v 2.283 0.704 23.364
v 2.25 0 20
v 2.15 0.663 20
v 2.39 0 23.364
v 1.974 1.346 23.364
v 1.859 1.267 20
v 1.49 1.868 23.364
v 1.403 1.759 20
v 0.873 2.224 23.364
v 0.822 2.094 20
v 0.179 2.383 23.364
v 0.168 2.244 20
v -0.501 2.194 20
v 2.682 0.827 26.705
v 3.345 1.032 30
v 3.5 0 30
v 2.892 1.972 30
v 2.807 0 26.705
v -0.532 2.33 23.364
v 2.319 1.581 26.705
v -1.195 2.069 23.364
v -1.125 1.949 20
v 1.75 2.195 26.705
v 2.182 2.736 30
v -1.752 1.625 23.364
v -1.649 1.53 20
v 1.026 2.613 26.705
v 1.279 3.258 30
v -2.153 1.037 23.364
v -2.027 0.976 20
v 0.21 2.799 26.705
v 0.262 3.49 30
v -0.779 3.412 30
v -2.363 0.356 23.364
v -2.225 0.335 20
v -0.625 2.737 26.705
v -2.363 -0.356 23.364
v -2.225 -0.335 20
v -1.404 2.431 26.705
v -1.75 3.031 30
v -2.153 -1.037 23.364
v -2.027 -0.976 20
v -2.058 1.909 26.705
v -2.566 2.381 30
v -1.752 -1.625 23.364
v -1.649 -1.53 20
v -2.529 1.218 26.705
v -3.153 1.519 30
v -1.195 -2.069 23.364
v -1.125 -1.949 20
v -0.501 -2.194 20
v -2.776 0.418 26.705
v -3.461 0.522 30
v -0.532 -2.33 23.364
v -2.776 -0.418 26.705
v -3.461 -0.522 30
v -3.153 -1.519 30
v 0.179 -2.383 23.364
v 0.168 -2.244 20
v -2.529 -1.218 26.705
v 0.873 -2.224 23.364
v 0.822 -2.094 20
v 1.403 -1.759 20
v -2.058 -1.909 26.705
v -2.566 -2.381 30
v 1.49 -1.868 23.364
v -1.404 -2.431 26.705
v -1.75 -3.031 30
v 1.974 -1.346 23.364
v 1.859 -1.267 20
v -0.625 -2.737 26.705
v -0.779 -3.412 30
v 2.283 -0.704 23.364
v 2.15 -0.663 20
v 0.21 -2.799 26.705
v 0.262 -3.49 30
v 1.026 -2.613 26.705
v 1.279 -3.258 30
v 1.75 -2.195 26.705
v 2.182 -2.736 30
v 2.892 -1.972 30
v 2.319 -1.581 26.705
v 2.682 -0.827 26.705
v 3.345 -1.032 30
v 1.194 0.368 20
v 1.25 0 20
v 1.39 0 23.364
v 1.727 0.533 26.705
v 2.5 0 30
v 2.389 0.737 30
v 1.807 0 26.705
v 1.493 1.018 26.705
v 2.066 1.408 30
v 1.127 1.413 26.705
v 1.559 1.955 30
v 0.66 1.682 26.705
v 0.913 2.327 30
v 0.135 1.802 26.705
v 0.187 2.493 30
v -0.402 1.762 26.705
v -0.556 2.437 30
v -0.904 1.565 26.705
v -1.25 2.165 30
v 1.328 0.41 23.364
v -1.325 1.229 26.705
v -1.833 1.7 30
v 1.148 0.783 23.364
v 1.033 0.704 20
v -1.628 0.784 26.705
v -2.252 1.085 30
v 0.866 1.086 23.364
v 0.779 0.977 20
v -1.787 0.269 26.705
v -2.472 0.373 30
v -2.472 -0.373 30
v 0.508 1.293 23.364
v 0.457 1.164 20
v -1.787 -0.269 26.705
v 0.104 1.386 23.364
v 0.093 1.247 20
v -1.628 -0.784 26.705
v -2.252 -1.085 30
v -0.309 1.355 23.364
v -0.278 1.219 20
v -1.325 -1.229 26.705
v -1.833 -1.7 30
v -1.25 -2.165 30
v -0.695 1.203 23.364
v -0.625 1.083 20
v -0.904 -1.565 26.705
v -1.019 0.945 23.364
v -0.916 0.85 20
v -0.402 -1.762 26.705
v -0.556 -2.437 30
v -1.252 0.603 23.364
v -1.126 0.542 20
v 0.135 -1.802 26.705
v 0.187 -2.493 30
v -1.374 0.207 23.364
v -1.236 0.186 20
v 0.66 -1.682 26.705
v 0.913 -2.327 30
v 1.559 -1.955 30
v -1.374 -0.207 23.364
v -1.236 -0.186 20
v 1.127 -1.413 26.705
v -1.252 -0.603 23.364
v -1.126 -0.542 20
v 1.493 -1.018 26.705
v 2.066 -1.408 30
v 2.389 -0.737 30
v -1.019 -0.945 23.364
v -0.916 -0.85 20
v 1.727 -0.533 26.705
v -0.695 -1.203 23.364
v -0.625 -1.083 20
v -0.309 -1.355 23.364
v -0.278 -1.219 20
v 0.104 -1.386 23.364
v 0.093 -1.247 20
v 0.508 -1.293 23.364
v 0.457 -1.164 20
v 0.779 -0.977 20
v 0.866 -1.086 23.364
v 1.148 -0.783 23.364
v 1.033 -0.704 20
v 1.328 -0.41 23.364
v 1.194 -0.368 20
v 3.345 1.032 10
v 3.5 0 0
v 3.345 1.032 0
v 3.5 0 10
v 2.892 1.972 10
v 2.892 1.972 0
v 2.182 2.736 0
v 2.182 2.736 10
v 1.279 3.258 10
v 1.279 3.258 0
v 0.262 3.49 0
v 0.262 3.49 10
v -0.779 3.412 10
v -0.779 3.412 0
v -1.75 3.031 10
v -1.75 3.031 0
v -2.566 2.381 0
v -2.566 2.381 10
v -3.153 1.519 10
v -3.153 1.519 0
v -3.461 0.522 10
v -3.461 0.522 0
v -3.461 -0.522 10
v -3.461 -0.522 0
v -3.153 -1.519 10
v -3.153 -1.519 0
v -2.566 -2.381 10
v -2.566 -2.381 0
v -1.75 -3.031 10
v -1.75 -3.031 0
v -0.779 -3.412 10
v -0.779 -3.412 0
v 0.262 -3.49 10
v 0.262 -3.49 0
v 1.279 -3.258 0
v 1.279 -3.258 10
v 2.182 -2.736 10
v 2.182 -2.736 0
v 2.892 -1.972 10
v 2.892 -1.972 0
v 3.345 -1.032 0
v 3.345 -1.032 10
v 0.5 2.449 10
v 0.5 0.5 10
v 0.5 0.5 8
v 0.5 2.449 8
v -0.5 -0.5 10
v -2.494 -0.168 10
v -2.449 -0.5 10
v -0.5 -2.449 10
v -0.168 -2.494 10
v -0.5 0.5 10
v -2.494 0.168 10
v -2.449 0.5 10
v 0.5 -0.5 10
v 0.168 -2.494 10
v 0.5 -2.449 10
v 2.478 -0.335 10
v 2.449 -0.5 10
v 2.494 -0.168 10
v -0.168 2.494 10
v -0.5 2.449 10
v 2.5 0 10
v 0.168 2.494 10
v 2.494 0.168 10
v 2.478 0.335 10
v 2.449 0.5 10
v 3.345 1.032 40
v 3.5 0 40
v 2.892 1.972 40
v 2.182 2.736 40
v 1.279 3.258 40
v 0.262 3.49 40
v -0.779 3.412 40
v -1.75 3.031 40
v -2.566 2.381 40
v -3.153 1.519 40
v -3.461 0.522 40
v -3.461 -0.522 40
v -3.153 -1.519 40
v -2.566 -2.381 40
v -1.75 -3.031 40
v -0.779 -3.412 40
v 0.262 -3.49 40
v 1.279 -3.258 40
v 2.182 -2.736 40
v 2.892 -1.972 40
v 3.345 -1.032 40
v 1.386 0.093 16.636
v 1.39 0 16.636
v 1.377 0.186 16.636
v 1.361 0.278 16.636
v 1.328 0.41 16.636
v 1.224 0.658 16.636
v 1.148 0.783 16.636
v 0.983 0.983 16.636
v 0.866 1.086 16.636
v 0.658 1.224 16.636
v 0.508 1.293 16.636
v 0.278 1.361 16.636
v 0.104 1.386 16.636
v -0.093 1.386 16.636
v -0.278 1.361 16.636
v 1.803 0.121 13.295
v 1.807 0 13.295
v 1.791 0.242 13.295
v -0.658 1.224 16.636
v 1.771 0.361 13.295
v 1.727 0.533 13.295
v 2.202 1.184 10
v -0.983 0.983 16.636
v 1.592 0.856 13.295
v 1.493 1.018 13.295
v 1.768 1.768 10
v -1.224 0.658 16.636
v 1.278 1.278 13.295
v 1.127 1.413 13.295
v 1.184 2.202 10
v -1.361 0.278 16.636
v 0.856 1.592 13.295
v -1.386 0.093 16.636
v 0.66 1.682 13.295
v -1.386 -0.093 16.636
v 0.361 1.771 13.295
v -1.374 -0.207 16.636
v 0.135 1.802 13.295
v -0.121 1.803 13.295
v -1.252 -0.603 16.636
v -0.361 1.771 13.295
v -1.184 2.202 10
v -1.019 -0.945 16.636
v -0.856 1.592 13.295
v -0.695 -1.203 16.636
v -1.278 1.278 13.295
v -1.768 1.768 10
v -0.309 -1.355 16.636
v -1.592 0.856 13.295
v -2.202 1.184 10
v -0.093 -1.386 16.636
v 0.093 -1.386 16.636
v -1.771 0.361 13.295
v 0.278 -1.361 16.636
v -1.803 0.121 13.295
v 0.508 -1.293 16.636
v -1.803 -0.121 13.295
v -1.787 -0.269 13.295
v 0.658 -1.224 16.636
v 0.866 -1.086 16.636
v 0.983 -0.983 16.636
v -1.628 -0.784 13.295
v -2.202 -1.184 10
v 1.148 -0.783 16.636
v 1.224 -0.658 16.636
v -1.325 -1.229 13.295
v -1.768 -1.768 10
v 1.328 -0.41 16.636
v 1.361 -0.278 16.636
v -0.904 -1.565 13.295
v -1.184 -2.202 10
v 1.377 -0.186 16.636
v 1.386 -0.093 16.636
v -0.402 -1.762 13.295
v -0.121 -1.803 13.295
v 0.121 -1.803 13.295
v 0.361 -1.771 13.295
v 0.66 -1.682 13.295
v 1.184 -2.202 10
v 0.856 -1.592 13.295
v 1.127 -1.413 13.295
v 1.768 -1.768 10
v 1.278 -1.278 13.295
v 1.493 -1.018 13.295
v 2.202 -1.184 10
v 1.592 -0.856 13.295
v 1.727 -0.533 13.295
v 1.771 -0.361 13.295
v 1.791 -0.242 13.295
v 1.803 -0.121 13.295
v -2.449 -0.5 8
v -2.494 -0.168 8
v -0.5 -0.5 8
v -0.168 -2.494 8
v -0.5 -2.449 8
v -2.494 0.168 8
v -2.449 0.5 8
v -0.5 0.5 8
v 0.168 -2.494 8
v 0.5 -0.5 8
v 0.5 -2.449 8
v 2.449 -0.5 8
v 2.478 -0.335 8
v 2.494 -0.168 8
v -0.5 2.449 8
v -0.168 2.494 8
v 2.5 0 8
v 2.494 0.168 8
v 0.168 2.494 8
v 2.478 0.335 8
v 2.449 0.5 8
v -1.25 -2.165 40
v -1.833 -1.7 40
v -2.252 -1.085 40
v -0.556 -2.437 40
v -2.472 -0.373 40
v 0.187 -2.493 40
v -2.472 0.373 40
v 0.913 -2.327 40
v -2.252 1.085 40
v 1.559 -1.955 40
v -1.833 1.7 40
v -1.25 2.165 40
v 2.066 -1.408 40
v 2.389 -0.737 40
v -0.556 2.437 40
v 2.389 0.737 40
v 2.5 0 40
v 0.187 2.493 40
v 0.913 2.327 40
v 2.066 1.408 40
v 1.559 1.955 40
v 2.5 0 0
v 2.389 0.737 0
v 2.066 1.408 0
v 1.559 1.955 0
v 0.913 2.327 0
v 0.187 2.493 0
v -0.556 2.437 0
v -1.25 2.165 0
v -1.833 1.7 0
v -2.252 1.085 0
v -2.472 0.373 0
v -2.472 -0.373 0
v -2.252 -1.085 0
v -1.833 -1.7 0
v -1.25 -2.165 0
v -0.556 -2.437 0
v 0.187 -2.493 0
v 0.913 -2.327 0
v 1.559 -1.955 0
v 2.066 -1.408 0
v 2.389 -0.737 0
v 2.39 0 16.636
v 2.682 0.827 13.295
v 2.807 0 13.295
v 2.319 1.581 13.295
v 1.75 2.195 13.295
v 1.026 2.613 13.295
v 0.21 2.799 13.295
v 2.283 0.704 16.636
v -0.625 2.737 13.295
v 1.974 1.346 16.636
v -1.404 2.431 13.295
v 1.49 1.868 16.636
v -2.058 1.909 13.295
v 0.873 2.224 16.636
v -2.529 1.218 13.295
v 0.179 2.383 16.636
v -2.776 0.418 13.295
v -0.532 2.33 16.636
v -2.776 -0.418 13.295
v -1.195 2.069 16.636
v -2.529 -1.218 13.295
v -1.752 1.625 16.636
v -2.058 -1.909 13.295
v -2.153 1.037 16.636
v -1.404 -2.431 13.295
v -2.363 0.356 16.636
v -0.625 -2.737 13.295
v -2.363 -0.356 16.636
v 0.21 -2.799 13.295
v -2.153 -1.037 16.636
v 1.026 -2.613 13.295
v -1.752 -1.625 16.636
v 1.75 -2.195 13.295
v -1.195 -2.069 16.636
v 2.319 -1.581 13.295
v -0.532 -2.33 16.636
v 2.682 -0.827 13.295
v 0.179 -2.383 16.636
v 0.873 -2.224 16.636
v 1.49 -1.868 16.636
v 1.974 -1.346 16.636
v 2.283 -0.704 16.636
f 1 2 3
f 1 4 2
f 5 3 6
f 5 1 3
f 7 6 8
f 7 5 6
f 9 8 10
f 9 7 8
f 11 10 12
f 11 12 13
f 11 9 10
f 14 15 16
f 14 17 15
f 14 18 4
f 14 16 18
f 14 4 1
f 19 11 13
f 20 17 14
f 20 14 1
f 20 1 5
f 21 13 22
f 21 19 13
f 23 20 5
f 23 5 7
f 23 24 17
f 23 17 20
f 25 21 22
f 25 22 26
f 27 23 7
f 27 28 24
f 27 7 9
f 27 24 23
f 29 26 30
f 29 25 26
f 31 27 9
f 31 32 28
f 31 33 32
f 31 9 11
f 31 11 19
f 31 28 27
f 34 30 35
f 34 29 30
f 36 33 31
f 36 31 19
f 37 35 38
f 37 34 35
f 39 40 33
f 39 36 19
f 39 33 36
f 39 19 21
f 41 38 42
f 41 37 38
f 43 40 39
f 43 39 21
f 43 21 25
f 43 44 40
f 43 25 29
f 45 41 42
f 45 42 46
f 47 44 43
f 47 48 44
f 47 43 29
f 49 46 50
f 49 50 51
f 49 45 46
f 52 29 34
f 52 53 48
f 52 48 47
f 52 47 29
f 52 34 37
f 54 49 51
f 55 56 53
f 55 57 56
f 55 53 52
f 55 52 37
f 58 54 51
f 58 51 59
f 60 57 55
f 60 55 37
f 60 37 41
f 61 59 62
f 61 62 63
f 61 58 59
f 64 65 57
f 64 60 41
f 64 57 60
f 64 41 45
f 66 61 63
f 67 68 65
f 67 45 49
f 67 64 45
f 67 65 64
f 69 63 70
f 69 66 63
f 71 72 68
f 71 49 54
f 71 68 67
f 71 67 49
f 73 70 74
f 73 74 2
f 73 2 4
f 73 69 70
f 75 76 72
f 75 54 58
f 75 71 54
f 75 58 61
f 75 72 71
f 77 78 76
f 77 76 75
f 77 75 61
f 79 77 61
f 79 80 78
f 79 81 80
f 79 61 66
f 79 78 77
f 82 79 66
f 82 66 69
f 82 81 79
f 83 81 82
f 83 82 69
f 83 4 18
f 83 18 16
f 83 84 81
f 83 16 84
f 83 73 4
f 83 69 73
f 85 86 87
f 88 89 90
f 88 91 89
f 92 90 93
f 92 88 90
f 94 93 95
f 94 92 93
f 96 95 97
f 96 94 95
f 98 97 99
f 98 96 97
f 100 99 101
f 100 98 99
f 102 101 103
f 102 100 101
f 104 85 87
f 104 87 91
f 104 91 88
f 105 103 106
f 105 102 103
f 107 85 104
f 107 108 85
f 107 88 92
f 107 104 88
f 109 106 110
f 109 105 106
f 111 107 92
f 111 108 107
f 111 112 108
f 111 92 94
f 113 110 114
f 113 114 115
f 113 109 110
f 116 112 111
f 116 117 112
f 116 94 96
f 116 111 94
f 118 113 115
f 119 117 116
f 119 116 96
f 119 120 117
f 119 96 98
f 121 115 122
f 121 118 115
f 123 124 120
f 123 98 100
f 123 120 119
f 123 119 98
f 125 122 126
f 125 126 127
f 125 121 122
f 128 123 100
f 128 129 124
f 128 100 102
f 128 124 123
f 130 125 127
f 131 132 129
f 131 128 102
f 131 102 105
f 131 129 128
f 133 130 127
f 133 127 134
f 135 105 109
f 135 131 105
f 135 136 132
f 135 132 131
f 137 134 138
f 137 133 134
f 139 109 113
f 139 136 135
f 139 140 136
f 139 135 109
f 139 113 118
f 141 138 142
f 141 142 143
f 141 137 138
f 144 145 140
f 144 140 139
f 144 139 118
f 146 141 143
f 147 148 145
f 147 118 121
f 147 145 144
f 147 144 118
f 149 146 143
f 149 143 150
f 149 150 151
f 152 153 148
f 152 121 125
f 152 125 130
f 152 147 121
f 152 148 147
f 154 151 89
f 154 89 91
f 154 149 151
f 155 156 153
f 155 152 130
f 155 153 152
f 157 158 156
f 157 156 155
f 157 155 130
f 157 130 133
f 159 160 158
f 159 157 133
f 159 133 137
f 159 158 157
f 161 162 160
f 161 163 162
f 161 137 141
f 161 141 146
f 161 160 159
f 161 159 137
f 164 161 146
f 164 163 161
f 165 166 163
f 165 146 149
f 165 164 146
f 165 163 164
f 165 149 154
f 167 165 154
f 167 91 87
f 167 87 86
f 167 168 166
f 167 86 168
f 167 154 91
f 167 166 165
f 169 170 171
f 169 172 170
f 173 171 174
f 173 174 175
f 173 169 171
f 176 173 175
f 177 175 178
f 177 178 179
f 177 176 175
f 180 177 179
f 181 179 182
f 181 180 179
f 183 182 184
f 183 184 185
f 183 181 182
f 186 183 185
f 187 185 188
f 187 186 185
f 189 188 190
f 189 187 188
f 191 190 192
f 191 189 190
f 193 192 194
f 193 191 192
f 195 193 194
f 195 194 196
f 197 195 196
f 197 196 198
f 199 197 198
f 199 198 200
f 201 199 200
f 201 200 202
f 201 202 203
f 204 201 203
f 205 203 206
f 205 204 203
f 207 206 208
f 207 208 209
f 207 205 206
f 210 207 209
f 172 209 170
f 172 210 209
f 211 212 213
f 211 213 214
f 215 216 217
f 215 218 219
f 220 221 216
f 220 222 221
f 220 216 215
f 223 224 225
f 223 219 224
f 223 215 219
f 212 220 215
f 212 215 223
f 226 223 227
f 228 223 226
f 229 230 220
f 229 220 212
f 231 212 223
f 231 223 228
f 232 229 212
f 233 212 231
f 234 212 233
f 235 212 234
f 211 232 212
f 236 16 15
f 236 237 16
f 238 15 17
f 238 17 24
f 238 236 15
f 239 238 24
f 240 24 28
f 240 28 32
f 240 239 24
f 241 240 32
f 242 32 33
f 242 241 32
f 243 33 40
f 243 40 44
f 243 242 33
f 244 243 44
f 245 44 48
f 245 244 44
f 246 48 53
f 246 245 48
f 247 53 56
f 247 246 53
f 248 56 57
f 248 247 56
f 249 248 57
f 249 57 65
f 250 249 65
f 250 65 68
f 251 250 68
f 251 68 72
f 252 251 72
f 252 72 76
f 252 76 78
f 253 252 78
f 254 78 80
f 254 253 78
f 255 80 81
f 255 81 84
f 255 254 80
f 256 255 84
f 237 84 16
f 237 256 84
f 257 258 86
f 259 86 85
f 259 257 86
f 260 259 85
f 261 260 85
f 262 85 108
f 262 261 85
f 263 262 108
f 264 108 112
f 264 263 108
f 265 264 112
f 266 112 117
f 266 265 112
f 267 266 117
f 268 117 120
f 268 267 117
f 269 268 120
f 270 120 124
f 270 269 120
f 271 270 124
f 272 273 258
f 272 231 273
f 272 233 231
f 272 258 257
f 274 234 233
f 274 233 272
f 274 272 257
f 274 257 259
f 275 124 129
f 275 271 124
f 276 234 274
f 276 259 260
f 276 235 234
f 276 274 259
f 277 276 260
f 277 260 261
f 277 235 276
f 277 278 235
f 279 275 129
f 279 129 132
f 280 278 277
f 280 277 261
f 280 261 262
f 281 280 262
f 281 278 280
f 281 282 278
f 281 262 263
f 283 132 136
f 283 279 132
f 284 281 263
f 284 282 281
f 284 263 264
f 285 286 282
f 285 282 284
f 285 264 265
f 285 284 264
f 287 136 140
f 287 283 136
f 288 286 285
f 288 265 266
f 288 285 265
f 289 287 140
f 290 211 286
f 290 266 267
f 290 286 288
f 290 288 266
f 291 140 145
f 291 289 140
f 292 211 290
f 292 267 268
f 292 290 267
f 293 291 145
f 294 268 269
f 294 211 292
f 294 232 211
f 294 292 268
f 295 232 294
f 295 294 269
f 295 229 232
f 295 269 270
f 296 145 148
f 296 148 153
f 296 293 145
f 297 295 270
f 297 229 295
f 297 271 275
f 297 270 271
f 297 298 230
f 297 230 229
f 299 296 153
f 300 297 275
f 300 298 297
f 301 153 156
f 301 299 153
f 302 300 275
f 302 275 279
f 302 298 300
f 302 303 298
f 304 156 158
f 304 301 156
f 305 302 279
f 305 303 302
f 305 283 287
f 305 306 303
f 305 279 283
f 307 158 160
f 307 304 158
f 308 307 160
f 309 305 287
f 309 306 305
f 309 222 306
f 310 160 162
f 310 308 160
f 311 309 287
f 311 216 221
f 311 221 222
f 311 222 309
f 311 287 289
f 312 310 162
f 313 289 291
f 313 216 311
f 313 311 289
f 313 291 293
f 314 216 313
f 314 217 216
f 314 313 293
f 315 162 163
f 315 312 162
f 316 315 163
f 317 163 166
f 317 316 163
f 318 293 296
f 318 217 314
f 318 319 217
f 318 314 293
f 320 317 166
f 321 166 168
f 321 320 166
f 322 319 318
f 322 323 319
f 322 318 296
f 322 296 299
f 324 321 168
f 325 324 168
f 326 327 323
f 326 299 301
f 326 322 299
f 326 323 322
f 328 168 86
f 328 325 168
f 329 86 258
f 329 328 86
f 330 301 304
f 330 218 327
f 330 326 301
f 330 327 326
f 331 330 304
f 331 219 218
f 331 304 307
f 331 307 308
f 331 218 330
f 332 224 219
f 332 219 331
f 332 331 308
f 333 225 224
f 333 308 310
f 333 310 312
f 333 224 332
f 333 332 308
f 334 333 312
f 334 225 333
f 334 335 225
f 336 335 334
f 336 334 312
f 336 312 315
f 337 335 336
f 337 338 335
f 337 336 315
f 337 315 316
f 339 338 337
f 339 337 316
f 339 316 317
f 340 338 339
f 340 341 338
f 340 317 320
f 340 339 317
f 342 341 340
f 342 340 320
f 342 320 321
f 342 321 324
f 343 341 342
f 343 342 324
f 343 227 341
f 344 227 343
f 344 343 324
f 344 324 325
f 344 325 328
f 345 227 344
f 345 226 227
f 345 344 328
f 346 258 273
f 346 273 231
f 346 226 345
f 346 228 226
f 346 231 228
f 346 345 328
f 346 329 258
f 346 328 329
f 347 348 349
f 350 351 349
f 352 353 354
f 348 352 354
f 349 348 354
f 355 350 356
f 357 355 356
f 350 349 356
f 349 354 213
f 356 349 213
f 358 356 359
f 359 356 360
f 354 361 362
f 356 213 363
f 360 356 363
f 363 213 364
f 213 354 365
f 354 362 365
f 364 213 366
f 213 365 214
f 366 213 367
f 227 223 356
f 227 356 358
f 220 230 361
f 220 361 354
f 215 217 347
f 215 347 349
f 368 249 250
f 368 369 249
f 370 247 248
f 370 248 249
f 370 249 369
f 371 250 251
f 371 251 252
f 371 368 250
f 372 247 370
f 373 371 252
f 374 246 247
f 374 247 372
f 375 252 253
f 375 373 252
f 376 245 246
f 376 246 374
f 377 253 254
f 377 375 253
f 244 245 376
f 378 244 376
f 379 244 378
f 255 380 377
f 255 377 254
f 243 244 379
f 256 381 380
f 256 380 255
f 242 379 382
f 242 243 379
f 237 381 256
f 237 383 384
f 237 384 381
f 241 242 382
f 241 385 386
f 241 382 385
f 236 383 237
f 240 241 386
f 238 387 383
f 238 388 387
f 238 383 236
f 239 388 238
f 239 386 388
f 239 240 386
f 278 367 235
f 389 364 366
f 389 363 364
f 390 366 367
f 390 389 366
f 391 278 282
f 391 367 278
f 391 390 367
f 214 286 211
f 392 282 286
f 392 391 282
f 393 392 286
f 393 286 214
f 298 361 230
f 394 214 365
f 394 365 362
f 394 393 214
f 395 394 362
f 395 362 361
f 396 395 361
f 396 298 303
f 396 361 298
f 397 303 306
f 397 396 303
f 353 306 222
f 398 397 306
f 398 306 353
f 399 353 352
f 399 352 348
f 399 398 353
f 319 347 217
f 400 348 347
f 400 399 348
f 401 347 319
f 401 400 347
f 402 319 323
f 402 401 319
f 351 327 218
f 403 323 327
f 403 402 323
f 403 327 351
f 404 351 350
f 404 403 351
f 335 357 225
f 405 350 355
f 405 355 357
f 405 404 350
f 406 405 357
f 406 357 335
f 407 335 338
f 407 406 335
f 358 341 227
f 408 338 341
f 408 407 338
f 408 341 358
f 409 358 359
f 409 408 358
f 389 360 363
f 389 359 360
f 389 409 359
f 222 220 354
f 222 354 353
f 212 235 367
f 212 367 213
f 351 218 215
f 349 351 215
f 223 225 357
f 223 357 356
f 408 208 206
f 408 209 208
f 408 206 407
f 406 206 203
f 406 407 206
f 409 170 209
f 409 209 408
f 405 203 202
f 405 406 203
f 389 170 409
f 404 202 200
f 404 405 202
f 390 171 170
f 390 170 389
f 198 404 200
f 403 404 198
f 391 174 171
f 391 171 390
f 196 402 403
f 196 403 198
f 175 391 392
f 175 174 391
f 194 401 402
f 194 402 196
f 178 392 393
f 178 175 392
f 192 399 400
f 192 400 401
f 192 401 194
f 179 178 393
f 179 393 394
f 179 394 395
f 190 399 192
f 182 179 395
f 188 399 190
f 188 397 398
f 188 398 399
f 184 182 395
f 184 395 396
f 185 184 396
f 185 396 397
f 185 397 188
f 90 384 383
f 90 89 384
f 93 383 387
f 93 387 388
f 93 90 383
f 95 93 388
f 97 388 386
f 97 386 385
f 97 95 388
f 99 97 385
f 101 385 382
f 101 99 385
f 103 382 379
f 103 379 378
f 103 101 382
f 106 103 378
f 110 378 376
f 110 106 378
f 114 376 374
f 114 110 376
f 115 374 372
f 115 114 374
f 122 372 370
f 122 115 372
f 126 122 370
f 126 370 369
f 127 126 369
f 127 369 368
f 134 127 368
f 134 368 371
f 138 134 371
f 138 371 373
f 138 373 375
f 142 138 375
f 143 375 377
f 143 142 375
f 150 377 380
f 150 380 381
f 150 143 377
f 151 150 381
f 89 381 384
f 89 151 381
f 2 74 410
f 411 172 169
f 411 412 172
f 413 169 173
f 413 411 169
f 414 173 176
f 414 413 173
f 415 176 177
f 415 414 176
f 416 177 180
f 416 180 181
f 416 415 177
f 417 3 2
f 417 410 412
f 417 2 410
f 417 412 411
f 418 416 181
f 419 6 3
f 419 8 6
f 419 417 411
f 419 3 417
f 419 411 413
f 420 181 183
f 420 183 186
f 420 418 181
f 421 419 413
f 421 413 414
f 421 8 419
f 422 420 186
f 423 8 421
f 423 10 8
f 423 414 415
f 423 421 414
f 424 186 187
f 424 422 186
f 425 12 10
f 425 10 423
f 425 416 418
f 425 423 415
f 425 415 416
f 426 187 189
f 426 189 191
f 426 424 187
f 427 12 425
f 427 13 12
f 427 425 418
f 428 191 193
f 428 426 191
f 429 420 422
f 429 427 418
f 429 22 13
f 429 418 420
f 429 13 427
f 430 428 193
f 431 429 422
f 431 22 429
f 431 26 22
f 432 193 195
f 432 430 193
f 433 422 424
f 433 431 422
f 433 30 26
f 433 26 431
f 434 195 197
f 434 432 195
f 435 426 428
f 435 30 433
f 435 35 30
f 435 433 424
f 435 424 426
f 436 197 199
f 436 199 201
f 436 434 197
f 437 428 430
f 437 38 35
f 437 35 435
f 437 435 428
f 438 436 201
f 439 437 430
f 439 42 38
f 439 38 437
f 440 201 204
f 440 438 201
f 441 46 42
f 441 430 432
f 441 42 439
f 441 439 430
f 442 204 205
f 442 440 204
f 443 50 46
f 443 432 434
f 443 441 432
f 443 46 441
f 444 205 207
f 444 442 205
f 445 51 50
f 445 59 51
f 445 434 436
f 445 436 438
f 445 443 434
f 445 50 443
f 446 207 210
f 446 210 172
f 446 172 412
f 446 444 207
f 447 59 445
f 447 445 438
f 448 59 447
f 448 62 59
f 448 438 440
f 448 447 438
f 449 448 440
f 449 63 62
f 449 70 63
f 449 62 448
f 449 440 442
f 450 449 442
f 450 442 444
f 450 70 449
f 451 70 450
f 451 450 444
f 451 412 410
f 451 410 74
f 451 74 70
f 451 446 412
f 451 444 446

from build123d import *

# Parameters (mm, degrees)
F2_W     = 0.5
F2_H     = 2
F2_W_2   = 1
F3_DEPTH = 2


with BuildPart() as f3:
    # F2 (on offset) → F3 (new body)
    with BuildSketch(Plane.XY.offset(10)):
        with Locations((-0.25, 1.5)):
            Rectangle(F2_W, F2_H)
        with Locations((0.25, 1.5)):
            Rectangle(F2_W, F2_H)
        Polygon((0.5, 0.5), (0, 0.5), (-0.5, 0.5), (-0.5, 0), (-0.5, -0.5), (0.5, -0.5), (0.5, 0), align=None)
        Polygon((2.5, 0.5), (0.5, 0.5), (0.5, 0), (0.5, -0.5), (2.5, -0.5), align=None)
        Polygon((-0.5, 0), (-0.5, 0.5), (-2.5, 0.5), (-2.5, -0.5), (-0.5, -0.5), align=None)
        with Locations((0, -1.5)):
            Rectangle(F2_W_2, F2_H)
    extrude(amount=-F3_DEPTH)

    # F0 (on Front) → F4 (revolve)
    with BuildSketch(Plane.XZ):
        with BuildLine():
            ThreePointArc((2.5, 30), (1.563711, 25.038911), (1.25, 20))
            Line((1.25, 20), (2.25, 20))
            ThreePointArc((2.25, 20), (2.563711, 25.038911), (3.5, 30))
            Line((3.5, 30), (3.5, 40))
            Line((3.5, 40), (2.5, 40))
            Line((2.5, 40), (2.5, 30))
        make_face()
        with BuildLine():
            Line((2.5, 10), (2.5, 0))
            Line((2.5, 0), (3.5, 0))
            Line((3.5, 0), (3.5, 10))
            ThreePointArc((3.5, 10), (2.563711, 14.961089), (2.25, 20))
            Line((2.25, 20), (1.25, 20))
            ThreePointArc((1.25, 20), (1.563711, 14.961089), (2.5, 10))
        make_face()
    revolve(axis=Axis((0, 0, 20), (0, 0, 1)))


solid = f3.part
